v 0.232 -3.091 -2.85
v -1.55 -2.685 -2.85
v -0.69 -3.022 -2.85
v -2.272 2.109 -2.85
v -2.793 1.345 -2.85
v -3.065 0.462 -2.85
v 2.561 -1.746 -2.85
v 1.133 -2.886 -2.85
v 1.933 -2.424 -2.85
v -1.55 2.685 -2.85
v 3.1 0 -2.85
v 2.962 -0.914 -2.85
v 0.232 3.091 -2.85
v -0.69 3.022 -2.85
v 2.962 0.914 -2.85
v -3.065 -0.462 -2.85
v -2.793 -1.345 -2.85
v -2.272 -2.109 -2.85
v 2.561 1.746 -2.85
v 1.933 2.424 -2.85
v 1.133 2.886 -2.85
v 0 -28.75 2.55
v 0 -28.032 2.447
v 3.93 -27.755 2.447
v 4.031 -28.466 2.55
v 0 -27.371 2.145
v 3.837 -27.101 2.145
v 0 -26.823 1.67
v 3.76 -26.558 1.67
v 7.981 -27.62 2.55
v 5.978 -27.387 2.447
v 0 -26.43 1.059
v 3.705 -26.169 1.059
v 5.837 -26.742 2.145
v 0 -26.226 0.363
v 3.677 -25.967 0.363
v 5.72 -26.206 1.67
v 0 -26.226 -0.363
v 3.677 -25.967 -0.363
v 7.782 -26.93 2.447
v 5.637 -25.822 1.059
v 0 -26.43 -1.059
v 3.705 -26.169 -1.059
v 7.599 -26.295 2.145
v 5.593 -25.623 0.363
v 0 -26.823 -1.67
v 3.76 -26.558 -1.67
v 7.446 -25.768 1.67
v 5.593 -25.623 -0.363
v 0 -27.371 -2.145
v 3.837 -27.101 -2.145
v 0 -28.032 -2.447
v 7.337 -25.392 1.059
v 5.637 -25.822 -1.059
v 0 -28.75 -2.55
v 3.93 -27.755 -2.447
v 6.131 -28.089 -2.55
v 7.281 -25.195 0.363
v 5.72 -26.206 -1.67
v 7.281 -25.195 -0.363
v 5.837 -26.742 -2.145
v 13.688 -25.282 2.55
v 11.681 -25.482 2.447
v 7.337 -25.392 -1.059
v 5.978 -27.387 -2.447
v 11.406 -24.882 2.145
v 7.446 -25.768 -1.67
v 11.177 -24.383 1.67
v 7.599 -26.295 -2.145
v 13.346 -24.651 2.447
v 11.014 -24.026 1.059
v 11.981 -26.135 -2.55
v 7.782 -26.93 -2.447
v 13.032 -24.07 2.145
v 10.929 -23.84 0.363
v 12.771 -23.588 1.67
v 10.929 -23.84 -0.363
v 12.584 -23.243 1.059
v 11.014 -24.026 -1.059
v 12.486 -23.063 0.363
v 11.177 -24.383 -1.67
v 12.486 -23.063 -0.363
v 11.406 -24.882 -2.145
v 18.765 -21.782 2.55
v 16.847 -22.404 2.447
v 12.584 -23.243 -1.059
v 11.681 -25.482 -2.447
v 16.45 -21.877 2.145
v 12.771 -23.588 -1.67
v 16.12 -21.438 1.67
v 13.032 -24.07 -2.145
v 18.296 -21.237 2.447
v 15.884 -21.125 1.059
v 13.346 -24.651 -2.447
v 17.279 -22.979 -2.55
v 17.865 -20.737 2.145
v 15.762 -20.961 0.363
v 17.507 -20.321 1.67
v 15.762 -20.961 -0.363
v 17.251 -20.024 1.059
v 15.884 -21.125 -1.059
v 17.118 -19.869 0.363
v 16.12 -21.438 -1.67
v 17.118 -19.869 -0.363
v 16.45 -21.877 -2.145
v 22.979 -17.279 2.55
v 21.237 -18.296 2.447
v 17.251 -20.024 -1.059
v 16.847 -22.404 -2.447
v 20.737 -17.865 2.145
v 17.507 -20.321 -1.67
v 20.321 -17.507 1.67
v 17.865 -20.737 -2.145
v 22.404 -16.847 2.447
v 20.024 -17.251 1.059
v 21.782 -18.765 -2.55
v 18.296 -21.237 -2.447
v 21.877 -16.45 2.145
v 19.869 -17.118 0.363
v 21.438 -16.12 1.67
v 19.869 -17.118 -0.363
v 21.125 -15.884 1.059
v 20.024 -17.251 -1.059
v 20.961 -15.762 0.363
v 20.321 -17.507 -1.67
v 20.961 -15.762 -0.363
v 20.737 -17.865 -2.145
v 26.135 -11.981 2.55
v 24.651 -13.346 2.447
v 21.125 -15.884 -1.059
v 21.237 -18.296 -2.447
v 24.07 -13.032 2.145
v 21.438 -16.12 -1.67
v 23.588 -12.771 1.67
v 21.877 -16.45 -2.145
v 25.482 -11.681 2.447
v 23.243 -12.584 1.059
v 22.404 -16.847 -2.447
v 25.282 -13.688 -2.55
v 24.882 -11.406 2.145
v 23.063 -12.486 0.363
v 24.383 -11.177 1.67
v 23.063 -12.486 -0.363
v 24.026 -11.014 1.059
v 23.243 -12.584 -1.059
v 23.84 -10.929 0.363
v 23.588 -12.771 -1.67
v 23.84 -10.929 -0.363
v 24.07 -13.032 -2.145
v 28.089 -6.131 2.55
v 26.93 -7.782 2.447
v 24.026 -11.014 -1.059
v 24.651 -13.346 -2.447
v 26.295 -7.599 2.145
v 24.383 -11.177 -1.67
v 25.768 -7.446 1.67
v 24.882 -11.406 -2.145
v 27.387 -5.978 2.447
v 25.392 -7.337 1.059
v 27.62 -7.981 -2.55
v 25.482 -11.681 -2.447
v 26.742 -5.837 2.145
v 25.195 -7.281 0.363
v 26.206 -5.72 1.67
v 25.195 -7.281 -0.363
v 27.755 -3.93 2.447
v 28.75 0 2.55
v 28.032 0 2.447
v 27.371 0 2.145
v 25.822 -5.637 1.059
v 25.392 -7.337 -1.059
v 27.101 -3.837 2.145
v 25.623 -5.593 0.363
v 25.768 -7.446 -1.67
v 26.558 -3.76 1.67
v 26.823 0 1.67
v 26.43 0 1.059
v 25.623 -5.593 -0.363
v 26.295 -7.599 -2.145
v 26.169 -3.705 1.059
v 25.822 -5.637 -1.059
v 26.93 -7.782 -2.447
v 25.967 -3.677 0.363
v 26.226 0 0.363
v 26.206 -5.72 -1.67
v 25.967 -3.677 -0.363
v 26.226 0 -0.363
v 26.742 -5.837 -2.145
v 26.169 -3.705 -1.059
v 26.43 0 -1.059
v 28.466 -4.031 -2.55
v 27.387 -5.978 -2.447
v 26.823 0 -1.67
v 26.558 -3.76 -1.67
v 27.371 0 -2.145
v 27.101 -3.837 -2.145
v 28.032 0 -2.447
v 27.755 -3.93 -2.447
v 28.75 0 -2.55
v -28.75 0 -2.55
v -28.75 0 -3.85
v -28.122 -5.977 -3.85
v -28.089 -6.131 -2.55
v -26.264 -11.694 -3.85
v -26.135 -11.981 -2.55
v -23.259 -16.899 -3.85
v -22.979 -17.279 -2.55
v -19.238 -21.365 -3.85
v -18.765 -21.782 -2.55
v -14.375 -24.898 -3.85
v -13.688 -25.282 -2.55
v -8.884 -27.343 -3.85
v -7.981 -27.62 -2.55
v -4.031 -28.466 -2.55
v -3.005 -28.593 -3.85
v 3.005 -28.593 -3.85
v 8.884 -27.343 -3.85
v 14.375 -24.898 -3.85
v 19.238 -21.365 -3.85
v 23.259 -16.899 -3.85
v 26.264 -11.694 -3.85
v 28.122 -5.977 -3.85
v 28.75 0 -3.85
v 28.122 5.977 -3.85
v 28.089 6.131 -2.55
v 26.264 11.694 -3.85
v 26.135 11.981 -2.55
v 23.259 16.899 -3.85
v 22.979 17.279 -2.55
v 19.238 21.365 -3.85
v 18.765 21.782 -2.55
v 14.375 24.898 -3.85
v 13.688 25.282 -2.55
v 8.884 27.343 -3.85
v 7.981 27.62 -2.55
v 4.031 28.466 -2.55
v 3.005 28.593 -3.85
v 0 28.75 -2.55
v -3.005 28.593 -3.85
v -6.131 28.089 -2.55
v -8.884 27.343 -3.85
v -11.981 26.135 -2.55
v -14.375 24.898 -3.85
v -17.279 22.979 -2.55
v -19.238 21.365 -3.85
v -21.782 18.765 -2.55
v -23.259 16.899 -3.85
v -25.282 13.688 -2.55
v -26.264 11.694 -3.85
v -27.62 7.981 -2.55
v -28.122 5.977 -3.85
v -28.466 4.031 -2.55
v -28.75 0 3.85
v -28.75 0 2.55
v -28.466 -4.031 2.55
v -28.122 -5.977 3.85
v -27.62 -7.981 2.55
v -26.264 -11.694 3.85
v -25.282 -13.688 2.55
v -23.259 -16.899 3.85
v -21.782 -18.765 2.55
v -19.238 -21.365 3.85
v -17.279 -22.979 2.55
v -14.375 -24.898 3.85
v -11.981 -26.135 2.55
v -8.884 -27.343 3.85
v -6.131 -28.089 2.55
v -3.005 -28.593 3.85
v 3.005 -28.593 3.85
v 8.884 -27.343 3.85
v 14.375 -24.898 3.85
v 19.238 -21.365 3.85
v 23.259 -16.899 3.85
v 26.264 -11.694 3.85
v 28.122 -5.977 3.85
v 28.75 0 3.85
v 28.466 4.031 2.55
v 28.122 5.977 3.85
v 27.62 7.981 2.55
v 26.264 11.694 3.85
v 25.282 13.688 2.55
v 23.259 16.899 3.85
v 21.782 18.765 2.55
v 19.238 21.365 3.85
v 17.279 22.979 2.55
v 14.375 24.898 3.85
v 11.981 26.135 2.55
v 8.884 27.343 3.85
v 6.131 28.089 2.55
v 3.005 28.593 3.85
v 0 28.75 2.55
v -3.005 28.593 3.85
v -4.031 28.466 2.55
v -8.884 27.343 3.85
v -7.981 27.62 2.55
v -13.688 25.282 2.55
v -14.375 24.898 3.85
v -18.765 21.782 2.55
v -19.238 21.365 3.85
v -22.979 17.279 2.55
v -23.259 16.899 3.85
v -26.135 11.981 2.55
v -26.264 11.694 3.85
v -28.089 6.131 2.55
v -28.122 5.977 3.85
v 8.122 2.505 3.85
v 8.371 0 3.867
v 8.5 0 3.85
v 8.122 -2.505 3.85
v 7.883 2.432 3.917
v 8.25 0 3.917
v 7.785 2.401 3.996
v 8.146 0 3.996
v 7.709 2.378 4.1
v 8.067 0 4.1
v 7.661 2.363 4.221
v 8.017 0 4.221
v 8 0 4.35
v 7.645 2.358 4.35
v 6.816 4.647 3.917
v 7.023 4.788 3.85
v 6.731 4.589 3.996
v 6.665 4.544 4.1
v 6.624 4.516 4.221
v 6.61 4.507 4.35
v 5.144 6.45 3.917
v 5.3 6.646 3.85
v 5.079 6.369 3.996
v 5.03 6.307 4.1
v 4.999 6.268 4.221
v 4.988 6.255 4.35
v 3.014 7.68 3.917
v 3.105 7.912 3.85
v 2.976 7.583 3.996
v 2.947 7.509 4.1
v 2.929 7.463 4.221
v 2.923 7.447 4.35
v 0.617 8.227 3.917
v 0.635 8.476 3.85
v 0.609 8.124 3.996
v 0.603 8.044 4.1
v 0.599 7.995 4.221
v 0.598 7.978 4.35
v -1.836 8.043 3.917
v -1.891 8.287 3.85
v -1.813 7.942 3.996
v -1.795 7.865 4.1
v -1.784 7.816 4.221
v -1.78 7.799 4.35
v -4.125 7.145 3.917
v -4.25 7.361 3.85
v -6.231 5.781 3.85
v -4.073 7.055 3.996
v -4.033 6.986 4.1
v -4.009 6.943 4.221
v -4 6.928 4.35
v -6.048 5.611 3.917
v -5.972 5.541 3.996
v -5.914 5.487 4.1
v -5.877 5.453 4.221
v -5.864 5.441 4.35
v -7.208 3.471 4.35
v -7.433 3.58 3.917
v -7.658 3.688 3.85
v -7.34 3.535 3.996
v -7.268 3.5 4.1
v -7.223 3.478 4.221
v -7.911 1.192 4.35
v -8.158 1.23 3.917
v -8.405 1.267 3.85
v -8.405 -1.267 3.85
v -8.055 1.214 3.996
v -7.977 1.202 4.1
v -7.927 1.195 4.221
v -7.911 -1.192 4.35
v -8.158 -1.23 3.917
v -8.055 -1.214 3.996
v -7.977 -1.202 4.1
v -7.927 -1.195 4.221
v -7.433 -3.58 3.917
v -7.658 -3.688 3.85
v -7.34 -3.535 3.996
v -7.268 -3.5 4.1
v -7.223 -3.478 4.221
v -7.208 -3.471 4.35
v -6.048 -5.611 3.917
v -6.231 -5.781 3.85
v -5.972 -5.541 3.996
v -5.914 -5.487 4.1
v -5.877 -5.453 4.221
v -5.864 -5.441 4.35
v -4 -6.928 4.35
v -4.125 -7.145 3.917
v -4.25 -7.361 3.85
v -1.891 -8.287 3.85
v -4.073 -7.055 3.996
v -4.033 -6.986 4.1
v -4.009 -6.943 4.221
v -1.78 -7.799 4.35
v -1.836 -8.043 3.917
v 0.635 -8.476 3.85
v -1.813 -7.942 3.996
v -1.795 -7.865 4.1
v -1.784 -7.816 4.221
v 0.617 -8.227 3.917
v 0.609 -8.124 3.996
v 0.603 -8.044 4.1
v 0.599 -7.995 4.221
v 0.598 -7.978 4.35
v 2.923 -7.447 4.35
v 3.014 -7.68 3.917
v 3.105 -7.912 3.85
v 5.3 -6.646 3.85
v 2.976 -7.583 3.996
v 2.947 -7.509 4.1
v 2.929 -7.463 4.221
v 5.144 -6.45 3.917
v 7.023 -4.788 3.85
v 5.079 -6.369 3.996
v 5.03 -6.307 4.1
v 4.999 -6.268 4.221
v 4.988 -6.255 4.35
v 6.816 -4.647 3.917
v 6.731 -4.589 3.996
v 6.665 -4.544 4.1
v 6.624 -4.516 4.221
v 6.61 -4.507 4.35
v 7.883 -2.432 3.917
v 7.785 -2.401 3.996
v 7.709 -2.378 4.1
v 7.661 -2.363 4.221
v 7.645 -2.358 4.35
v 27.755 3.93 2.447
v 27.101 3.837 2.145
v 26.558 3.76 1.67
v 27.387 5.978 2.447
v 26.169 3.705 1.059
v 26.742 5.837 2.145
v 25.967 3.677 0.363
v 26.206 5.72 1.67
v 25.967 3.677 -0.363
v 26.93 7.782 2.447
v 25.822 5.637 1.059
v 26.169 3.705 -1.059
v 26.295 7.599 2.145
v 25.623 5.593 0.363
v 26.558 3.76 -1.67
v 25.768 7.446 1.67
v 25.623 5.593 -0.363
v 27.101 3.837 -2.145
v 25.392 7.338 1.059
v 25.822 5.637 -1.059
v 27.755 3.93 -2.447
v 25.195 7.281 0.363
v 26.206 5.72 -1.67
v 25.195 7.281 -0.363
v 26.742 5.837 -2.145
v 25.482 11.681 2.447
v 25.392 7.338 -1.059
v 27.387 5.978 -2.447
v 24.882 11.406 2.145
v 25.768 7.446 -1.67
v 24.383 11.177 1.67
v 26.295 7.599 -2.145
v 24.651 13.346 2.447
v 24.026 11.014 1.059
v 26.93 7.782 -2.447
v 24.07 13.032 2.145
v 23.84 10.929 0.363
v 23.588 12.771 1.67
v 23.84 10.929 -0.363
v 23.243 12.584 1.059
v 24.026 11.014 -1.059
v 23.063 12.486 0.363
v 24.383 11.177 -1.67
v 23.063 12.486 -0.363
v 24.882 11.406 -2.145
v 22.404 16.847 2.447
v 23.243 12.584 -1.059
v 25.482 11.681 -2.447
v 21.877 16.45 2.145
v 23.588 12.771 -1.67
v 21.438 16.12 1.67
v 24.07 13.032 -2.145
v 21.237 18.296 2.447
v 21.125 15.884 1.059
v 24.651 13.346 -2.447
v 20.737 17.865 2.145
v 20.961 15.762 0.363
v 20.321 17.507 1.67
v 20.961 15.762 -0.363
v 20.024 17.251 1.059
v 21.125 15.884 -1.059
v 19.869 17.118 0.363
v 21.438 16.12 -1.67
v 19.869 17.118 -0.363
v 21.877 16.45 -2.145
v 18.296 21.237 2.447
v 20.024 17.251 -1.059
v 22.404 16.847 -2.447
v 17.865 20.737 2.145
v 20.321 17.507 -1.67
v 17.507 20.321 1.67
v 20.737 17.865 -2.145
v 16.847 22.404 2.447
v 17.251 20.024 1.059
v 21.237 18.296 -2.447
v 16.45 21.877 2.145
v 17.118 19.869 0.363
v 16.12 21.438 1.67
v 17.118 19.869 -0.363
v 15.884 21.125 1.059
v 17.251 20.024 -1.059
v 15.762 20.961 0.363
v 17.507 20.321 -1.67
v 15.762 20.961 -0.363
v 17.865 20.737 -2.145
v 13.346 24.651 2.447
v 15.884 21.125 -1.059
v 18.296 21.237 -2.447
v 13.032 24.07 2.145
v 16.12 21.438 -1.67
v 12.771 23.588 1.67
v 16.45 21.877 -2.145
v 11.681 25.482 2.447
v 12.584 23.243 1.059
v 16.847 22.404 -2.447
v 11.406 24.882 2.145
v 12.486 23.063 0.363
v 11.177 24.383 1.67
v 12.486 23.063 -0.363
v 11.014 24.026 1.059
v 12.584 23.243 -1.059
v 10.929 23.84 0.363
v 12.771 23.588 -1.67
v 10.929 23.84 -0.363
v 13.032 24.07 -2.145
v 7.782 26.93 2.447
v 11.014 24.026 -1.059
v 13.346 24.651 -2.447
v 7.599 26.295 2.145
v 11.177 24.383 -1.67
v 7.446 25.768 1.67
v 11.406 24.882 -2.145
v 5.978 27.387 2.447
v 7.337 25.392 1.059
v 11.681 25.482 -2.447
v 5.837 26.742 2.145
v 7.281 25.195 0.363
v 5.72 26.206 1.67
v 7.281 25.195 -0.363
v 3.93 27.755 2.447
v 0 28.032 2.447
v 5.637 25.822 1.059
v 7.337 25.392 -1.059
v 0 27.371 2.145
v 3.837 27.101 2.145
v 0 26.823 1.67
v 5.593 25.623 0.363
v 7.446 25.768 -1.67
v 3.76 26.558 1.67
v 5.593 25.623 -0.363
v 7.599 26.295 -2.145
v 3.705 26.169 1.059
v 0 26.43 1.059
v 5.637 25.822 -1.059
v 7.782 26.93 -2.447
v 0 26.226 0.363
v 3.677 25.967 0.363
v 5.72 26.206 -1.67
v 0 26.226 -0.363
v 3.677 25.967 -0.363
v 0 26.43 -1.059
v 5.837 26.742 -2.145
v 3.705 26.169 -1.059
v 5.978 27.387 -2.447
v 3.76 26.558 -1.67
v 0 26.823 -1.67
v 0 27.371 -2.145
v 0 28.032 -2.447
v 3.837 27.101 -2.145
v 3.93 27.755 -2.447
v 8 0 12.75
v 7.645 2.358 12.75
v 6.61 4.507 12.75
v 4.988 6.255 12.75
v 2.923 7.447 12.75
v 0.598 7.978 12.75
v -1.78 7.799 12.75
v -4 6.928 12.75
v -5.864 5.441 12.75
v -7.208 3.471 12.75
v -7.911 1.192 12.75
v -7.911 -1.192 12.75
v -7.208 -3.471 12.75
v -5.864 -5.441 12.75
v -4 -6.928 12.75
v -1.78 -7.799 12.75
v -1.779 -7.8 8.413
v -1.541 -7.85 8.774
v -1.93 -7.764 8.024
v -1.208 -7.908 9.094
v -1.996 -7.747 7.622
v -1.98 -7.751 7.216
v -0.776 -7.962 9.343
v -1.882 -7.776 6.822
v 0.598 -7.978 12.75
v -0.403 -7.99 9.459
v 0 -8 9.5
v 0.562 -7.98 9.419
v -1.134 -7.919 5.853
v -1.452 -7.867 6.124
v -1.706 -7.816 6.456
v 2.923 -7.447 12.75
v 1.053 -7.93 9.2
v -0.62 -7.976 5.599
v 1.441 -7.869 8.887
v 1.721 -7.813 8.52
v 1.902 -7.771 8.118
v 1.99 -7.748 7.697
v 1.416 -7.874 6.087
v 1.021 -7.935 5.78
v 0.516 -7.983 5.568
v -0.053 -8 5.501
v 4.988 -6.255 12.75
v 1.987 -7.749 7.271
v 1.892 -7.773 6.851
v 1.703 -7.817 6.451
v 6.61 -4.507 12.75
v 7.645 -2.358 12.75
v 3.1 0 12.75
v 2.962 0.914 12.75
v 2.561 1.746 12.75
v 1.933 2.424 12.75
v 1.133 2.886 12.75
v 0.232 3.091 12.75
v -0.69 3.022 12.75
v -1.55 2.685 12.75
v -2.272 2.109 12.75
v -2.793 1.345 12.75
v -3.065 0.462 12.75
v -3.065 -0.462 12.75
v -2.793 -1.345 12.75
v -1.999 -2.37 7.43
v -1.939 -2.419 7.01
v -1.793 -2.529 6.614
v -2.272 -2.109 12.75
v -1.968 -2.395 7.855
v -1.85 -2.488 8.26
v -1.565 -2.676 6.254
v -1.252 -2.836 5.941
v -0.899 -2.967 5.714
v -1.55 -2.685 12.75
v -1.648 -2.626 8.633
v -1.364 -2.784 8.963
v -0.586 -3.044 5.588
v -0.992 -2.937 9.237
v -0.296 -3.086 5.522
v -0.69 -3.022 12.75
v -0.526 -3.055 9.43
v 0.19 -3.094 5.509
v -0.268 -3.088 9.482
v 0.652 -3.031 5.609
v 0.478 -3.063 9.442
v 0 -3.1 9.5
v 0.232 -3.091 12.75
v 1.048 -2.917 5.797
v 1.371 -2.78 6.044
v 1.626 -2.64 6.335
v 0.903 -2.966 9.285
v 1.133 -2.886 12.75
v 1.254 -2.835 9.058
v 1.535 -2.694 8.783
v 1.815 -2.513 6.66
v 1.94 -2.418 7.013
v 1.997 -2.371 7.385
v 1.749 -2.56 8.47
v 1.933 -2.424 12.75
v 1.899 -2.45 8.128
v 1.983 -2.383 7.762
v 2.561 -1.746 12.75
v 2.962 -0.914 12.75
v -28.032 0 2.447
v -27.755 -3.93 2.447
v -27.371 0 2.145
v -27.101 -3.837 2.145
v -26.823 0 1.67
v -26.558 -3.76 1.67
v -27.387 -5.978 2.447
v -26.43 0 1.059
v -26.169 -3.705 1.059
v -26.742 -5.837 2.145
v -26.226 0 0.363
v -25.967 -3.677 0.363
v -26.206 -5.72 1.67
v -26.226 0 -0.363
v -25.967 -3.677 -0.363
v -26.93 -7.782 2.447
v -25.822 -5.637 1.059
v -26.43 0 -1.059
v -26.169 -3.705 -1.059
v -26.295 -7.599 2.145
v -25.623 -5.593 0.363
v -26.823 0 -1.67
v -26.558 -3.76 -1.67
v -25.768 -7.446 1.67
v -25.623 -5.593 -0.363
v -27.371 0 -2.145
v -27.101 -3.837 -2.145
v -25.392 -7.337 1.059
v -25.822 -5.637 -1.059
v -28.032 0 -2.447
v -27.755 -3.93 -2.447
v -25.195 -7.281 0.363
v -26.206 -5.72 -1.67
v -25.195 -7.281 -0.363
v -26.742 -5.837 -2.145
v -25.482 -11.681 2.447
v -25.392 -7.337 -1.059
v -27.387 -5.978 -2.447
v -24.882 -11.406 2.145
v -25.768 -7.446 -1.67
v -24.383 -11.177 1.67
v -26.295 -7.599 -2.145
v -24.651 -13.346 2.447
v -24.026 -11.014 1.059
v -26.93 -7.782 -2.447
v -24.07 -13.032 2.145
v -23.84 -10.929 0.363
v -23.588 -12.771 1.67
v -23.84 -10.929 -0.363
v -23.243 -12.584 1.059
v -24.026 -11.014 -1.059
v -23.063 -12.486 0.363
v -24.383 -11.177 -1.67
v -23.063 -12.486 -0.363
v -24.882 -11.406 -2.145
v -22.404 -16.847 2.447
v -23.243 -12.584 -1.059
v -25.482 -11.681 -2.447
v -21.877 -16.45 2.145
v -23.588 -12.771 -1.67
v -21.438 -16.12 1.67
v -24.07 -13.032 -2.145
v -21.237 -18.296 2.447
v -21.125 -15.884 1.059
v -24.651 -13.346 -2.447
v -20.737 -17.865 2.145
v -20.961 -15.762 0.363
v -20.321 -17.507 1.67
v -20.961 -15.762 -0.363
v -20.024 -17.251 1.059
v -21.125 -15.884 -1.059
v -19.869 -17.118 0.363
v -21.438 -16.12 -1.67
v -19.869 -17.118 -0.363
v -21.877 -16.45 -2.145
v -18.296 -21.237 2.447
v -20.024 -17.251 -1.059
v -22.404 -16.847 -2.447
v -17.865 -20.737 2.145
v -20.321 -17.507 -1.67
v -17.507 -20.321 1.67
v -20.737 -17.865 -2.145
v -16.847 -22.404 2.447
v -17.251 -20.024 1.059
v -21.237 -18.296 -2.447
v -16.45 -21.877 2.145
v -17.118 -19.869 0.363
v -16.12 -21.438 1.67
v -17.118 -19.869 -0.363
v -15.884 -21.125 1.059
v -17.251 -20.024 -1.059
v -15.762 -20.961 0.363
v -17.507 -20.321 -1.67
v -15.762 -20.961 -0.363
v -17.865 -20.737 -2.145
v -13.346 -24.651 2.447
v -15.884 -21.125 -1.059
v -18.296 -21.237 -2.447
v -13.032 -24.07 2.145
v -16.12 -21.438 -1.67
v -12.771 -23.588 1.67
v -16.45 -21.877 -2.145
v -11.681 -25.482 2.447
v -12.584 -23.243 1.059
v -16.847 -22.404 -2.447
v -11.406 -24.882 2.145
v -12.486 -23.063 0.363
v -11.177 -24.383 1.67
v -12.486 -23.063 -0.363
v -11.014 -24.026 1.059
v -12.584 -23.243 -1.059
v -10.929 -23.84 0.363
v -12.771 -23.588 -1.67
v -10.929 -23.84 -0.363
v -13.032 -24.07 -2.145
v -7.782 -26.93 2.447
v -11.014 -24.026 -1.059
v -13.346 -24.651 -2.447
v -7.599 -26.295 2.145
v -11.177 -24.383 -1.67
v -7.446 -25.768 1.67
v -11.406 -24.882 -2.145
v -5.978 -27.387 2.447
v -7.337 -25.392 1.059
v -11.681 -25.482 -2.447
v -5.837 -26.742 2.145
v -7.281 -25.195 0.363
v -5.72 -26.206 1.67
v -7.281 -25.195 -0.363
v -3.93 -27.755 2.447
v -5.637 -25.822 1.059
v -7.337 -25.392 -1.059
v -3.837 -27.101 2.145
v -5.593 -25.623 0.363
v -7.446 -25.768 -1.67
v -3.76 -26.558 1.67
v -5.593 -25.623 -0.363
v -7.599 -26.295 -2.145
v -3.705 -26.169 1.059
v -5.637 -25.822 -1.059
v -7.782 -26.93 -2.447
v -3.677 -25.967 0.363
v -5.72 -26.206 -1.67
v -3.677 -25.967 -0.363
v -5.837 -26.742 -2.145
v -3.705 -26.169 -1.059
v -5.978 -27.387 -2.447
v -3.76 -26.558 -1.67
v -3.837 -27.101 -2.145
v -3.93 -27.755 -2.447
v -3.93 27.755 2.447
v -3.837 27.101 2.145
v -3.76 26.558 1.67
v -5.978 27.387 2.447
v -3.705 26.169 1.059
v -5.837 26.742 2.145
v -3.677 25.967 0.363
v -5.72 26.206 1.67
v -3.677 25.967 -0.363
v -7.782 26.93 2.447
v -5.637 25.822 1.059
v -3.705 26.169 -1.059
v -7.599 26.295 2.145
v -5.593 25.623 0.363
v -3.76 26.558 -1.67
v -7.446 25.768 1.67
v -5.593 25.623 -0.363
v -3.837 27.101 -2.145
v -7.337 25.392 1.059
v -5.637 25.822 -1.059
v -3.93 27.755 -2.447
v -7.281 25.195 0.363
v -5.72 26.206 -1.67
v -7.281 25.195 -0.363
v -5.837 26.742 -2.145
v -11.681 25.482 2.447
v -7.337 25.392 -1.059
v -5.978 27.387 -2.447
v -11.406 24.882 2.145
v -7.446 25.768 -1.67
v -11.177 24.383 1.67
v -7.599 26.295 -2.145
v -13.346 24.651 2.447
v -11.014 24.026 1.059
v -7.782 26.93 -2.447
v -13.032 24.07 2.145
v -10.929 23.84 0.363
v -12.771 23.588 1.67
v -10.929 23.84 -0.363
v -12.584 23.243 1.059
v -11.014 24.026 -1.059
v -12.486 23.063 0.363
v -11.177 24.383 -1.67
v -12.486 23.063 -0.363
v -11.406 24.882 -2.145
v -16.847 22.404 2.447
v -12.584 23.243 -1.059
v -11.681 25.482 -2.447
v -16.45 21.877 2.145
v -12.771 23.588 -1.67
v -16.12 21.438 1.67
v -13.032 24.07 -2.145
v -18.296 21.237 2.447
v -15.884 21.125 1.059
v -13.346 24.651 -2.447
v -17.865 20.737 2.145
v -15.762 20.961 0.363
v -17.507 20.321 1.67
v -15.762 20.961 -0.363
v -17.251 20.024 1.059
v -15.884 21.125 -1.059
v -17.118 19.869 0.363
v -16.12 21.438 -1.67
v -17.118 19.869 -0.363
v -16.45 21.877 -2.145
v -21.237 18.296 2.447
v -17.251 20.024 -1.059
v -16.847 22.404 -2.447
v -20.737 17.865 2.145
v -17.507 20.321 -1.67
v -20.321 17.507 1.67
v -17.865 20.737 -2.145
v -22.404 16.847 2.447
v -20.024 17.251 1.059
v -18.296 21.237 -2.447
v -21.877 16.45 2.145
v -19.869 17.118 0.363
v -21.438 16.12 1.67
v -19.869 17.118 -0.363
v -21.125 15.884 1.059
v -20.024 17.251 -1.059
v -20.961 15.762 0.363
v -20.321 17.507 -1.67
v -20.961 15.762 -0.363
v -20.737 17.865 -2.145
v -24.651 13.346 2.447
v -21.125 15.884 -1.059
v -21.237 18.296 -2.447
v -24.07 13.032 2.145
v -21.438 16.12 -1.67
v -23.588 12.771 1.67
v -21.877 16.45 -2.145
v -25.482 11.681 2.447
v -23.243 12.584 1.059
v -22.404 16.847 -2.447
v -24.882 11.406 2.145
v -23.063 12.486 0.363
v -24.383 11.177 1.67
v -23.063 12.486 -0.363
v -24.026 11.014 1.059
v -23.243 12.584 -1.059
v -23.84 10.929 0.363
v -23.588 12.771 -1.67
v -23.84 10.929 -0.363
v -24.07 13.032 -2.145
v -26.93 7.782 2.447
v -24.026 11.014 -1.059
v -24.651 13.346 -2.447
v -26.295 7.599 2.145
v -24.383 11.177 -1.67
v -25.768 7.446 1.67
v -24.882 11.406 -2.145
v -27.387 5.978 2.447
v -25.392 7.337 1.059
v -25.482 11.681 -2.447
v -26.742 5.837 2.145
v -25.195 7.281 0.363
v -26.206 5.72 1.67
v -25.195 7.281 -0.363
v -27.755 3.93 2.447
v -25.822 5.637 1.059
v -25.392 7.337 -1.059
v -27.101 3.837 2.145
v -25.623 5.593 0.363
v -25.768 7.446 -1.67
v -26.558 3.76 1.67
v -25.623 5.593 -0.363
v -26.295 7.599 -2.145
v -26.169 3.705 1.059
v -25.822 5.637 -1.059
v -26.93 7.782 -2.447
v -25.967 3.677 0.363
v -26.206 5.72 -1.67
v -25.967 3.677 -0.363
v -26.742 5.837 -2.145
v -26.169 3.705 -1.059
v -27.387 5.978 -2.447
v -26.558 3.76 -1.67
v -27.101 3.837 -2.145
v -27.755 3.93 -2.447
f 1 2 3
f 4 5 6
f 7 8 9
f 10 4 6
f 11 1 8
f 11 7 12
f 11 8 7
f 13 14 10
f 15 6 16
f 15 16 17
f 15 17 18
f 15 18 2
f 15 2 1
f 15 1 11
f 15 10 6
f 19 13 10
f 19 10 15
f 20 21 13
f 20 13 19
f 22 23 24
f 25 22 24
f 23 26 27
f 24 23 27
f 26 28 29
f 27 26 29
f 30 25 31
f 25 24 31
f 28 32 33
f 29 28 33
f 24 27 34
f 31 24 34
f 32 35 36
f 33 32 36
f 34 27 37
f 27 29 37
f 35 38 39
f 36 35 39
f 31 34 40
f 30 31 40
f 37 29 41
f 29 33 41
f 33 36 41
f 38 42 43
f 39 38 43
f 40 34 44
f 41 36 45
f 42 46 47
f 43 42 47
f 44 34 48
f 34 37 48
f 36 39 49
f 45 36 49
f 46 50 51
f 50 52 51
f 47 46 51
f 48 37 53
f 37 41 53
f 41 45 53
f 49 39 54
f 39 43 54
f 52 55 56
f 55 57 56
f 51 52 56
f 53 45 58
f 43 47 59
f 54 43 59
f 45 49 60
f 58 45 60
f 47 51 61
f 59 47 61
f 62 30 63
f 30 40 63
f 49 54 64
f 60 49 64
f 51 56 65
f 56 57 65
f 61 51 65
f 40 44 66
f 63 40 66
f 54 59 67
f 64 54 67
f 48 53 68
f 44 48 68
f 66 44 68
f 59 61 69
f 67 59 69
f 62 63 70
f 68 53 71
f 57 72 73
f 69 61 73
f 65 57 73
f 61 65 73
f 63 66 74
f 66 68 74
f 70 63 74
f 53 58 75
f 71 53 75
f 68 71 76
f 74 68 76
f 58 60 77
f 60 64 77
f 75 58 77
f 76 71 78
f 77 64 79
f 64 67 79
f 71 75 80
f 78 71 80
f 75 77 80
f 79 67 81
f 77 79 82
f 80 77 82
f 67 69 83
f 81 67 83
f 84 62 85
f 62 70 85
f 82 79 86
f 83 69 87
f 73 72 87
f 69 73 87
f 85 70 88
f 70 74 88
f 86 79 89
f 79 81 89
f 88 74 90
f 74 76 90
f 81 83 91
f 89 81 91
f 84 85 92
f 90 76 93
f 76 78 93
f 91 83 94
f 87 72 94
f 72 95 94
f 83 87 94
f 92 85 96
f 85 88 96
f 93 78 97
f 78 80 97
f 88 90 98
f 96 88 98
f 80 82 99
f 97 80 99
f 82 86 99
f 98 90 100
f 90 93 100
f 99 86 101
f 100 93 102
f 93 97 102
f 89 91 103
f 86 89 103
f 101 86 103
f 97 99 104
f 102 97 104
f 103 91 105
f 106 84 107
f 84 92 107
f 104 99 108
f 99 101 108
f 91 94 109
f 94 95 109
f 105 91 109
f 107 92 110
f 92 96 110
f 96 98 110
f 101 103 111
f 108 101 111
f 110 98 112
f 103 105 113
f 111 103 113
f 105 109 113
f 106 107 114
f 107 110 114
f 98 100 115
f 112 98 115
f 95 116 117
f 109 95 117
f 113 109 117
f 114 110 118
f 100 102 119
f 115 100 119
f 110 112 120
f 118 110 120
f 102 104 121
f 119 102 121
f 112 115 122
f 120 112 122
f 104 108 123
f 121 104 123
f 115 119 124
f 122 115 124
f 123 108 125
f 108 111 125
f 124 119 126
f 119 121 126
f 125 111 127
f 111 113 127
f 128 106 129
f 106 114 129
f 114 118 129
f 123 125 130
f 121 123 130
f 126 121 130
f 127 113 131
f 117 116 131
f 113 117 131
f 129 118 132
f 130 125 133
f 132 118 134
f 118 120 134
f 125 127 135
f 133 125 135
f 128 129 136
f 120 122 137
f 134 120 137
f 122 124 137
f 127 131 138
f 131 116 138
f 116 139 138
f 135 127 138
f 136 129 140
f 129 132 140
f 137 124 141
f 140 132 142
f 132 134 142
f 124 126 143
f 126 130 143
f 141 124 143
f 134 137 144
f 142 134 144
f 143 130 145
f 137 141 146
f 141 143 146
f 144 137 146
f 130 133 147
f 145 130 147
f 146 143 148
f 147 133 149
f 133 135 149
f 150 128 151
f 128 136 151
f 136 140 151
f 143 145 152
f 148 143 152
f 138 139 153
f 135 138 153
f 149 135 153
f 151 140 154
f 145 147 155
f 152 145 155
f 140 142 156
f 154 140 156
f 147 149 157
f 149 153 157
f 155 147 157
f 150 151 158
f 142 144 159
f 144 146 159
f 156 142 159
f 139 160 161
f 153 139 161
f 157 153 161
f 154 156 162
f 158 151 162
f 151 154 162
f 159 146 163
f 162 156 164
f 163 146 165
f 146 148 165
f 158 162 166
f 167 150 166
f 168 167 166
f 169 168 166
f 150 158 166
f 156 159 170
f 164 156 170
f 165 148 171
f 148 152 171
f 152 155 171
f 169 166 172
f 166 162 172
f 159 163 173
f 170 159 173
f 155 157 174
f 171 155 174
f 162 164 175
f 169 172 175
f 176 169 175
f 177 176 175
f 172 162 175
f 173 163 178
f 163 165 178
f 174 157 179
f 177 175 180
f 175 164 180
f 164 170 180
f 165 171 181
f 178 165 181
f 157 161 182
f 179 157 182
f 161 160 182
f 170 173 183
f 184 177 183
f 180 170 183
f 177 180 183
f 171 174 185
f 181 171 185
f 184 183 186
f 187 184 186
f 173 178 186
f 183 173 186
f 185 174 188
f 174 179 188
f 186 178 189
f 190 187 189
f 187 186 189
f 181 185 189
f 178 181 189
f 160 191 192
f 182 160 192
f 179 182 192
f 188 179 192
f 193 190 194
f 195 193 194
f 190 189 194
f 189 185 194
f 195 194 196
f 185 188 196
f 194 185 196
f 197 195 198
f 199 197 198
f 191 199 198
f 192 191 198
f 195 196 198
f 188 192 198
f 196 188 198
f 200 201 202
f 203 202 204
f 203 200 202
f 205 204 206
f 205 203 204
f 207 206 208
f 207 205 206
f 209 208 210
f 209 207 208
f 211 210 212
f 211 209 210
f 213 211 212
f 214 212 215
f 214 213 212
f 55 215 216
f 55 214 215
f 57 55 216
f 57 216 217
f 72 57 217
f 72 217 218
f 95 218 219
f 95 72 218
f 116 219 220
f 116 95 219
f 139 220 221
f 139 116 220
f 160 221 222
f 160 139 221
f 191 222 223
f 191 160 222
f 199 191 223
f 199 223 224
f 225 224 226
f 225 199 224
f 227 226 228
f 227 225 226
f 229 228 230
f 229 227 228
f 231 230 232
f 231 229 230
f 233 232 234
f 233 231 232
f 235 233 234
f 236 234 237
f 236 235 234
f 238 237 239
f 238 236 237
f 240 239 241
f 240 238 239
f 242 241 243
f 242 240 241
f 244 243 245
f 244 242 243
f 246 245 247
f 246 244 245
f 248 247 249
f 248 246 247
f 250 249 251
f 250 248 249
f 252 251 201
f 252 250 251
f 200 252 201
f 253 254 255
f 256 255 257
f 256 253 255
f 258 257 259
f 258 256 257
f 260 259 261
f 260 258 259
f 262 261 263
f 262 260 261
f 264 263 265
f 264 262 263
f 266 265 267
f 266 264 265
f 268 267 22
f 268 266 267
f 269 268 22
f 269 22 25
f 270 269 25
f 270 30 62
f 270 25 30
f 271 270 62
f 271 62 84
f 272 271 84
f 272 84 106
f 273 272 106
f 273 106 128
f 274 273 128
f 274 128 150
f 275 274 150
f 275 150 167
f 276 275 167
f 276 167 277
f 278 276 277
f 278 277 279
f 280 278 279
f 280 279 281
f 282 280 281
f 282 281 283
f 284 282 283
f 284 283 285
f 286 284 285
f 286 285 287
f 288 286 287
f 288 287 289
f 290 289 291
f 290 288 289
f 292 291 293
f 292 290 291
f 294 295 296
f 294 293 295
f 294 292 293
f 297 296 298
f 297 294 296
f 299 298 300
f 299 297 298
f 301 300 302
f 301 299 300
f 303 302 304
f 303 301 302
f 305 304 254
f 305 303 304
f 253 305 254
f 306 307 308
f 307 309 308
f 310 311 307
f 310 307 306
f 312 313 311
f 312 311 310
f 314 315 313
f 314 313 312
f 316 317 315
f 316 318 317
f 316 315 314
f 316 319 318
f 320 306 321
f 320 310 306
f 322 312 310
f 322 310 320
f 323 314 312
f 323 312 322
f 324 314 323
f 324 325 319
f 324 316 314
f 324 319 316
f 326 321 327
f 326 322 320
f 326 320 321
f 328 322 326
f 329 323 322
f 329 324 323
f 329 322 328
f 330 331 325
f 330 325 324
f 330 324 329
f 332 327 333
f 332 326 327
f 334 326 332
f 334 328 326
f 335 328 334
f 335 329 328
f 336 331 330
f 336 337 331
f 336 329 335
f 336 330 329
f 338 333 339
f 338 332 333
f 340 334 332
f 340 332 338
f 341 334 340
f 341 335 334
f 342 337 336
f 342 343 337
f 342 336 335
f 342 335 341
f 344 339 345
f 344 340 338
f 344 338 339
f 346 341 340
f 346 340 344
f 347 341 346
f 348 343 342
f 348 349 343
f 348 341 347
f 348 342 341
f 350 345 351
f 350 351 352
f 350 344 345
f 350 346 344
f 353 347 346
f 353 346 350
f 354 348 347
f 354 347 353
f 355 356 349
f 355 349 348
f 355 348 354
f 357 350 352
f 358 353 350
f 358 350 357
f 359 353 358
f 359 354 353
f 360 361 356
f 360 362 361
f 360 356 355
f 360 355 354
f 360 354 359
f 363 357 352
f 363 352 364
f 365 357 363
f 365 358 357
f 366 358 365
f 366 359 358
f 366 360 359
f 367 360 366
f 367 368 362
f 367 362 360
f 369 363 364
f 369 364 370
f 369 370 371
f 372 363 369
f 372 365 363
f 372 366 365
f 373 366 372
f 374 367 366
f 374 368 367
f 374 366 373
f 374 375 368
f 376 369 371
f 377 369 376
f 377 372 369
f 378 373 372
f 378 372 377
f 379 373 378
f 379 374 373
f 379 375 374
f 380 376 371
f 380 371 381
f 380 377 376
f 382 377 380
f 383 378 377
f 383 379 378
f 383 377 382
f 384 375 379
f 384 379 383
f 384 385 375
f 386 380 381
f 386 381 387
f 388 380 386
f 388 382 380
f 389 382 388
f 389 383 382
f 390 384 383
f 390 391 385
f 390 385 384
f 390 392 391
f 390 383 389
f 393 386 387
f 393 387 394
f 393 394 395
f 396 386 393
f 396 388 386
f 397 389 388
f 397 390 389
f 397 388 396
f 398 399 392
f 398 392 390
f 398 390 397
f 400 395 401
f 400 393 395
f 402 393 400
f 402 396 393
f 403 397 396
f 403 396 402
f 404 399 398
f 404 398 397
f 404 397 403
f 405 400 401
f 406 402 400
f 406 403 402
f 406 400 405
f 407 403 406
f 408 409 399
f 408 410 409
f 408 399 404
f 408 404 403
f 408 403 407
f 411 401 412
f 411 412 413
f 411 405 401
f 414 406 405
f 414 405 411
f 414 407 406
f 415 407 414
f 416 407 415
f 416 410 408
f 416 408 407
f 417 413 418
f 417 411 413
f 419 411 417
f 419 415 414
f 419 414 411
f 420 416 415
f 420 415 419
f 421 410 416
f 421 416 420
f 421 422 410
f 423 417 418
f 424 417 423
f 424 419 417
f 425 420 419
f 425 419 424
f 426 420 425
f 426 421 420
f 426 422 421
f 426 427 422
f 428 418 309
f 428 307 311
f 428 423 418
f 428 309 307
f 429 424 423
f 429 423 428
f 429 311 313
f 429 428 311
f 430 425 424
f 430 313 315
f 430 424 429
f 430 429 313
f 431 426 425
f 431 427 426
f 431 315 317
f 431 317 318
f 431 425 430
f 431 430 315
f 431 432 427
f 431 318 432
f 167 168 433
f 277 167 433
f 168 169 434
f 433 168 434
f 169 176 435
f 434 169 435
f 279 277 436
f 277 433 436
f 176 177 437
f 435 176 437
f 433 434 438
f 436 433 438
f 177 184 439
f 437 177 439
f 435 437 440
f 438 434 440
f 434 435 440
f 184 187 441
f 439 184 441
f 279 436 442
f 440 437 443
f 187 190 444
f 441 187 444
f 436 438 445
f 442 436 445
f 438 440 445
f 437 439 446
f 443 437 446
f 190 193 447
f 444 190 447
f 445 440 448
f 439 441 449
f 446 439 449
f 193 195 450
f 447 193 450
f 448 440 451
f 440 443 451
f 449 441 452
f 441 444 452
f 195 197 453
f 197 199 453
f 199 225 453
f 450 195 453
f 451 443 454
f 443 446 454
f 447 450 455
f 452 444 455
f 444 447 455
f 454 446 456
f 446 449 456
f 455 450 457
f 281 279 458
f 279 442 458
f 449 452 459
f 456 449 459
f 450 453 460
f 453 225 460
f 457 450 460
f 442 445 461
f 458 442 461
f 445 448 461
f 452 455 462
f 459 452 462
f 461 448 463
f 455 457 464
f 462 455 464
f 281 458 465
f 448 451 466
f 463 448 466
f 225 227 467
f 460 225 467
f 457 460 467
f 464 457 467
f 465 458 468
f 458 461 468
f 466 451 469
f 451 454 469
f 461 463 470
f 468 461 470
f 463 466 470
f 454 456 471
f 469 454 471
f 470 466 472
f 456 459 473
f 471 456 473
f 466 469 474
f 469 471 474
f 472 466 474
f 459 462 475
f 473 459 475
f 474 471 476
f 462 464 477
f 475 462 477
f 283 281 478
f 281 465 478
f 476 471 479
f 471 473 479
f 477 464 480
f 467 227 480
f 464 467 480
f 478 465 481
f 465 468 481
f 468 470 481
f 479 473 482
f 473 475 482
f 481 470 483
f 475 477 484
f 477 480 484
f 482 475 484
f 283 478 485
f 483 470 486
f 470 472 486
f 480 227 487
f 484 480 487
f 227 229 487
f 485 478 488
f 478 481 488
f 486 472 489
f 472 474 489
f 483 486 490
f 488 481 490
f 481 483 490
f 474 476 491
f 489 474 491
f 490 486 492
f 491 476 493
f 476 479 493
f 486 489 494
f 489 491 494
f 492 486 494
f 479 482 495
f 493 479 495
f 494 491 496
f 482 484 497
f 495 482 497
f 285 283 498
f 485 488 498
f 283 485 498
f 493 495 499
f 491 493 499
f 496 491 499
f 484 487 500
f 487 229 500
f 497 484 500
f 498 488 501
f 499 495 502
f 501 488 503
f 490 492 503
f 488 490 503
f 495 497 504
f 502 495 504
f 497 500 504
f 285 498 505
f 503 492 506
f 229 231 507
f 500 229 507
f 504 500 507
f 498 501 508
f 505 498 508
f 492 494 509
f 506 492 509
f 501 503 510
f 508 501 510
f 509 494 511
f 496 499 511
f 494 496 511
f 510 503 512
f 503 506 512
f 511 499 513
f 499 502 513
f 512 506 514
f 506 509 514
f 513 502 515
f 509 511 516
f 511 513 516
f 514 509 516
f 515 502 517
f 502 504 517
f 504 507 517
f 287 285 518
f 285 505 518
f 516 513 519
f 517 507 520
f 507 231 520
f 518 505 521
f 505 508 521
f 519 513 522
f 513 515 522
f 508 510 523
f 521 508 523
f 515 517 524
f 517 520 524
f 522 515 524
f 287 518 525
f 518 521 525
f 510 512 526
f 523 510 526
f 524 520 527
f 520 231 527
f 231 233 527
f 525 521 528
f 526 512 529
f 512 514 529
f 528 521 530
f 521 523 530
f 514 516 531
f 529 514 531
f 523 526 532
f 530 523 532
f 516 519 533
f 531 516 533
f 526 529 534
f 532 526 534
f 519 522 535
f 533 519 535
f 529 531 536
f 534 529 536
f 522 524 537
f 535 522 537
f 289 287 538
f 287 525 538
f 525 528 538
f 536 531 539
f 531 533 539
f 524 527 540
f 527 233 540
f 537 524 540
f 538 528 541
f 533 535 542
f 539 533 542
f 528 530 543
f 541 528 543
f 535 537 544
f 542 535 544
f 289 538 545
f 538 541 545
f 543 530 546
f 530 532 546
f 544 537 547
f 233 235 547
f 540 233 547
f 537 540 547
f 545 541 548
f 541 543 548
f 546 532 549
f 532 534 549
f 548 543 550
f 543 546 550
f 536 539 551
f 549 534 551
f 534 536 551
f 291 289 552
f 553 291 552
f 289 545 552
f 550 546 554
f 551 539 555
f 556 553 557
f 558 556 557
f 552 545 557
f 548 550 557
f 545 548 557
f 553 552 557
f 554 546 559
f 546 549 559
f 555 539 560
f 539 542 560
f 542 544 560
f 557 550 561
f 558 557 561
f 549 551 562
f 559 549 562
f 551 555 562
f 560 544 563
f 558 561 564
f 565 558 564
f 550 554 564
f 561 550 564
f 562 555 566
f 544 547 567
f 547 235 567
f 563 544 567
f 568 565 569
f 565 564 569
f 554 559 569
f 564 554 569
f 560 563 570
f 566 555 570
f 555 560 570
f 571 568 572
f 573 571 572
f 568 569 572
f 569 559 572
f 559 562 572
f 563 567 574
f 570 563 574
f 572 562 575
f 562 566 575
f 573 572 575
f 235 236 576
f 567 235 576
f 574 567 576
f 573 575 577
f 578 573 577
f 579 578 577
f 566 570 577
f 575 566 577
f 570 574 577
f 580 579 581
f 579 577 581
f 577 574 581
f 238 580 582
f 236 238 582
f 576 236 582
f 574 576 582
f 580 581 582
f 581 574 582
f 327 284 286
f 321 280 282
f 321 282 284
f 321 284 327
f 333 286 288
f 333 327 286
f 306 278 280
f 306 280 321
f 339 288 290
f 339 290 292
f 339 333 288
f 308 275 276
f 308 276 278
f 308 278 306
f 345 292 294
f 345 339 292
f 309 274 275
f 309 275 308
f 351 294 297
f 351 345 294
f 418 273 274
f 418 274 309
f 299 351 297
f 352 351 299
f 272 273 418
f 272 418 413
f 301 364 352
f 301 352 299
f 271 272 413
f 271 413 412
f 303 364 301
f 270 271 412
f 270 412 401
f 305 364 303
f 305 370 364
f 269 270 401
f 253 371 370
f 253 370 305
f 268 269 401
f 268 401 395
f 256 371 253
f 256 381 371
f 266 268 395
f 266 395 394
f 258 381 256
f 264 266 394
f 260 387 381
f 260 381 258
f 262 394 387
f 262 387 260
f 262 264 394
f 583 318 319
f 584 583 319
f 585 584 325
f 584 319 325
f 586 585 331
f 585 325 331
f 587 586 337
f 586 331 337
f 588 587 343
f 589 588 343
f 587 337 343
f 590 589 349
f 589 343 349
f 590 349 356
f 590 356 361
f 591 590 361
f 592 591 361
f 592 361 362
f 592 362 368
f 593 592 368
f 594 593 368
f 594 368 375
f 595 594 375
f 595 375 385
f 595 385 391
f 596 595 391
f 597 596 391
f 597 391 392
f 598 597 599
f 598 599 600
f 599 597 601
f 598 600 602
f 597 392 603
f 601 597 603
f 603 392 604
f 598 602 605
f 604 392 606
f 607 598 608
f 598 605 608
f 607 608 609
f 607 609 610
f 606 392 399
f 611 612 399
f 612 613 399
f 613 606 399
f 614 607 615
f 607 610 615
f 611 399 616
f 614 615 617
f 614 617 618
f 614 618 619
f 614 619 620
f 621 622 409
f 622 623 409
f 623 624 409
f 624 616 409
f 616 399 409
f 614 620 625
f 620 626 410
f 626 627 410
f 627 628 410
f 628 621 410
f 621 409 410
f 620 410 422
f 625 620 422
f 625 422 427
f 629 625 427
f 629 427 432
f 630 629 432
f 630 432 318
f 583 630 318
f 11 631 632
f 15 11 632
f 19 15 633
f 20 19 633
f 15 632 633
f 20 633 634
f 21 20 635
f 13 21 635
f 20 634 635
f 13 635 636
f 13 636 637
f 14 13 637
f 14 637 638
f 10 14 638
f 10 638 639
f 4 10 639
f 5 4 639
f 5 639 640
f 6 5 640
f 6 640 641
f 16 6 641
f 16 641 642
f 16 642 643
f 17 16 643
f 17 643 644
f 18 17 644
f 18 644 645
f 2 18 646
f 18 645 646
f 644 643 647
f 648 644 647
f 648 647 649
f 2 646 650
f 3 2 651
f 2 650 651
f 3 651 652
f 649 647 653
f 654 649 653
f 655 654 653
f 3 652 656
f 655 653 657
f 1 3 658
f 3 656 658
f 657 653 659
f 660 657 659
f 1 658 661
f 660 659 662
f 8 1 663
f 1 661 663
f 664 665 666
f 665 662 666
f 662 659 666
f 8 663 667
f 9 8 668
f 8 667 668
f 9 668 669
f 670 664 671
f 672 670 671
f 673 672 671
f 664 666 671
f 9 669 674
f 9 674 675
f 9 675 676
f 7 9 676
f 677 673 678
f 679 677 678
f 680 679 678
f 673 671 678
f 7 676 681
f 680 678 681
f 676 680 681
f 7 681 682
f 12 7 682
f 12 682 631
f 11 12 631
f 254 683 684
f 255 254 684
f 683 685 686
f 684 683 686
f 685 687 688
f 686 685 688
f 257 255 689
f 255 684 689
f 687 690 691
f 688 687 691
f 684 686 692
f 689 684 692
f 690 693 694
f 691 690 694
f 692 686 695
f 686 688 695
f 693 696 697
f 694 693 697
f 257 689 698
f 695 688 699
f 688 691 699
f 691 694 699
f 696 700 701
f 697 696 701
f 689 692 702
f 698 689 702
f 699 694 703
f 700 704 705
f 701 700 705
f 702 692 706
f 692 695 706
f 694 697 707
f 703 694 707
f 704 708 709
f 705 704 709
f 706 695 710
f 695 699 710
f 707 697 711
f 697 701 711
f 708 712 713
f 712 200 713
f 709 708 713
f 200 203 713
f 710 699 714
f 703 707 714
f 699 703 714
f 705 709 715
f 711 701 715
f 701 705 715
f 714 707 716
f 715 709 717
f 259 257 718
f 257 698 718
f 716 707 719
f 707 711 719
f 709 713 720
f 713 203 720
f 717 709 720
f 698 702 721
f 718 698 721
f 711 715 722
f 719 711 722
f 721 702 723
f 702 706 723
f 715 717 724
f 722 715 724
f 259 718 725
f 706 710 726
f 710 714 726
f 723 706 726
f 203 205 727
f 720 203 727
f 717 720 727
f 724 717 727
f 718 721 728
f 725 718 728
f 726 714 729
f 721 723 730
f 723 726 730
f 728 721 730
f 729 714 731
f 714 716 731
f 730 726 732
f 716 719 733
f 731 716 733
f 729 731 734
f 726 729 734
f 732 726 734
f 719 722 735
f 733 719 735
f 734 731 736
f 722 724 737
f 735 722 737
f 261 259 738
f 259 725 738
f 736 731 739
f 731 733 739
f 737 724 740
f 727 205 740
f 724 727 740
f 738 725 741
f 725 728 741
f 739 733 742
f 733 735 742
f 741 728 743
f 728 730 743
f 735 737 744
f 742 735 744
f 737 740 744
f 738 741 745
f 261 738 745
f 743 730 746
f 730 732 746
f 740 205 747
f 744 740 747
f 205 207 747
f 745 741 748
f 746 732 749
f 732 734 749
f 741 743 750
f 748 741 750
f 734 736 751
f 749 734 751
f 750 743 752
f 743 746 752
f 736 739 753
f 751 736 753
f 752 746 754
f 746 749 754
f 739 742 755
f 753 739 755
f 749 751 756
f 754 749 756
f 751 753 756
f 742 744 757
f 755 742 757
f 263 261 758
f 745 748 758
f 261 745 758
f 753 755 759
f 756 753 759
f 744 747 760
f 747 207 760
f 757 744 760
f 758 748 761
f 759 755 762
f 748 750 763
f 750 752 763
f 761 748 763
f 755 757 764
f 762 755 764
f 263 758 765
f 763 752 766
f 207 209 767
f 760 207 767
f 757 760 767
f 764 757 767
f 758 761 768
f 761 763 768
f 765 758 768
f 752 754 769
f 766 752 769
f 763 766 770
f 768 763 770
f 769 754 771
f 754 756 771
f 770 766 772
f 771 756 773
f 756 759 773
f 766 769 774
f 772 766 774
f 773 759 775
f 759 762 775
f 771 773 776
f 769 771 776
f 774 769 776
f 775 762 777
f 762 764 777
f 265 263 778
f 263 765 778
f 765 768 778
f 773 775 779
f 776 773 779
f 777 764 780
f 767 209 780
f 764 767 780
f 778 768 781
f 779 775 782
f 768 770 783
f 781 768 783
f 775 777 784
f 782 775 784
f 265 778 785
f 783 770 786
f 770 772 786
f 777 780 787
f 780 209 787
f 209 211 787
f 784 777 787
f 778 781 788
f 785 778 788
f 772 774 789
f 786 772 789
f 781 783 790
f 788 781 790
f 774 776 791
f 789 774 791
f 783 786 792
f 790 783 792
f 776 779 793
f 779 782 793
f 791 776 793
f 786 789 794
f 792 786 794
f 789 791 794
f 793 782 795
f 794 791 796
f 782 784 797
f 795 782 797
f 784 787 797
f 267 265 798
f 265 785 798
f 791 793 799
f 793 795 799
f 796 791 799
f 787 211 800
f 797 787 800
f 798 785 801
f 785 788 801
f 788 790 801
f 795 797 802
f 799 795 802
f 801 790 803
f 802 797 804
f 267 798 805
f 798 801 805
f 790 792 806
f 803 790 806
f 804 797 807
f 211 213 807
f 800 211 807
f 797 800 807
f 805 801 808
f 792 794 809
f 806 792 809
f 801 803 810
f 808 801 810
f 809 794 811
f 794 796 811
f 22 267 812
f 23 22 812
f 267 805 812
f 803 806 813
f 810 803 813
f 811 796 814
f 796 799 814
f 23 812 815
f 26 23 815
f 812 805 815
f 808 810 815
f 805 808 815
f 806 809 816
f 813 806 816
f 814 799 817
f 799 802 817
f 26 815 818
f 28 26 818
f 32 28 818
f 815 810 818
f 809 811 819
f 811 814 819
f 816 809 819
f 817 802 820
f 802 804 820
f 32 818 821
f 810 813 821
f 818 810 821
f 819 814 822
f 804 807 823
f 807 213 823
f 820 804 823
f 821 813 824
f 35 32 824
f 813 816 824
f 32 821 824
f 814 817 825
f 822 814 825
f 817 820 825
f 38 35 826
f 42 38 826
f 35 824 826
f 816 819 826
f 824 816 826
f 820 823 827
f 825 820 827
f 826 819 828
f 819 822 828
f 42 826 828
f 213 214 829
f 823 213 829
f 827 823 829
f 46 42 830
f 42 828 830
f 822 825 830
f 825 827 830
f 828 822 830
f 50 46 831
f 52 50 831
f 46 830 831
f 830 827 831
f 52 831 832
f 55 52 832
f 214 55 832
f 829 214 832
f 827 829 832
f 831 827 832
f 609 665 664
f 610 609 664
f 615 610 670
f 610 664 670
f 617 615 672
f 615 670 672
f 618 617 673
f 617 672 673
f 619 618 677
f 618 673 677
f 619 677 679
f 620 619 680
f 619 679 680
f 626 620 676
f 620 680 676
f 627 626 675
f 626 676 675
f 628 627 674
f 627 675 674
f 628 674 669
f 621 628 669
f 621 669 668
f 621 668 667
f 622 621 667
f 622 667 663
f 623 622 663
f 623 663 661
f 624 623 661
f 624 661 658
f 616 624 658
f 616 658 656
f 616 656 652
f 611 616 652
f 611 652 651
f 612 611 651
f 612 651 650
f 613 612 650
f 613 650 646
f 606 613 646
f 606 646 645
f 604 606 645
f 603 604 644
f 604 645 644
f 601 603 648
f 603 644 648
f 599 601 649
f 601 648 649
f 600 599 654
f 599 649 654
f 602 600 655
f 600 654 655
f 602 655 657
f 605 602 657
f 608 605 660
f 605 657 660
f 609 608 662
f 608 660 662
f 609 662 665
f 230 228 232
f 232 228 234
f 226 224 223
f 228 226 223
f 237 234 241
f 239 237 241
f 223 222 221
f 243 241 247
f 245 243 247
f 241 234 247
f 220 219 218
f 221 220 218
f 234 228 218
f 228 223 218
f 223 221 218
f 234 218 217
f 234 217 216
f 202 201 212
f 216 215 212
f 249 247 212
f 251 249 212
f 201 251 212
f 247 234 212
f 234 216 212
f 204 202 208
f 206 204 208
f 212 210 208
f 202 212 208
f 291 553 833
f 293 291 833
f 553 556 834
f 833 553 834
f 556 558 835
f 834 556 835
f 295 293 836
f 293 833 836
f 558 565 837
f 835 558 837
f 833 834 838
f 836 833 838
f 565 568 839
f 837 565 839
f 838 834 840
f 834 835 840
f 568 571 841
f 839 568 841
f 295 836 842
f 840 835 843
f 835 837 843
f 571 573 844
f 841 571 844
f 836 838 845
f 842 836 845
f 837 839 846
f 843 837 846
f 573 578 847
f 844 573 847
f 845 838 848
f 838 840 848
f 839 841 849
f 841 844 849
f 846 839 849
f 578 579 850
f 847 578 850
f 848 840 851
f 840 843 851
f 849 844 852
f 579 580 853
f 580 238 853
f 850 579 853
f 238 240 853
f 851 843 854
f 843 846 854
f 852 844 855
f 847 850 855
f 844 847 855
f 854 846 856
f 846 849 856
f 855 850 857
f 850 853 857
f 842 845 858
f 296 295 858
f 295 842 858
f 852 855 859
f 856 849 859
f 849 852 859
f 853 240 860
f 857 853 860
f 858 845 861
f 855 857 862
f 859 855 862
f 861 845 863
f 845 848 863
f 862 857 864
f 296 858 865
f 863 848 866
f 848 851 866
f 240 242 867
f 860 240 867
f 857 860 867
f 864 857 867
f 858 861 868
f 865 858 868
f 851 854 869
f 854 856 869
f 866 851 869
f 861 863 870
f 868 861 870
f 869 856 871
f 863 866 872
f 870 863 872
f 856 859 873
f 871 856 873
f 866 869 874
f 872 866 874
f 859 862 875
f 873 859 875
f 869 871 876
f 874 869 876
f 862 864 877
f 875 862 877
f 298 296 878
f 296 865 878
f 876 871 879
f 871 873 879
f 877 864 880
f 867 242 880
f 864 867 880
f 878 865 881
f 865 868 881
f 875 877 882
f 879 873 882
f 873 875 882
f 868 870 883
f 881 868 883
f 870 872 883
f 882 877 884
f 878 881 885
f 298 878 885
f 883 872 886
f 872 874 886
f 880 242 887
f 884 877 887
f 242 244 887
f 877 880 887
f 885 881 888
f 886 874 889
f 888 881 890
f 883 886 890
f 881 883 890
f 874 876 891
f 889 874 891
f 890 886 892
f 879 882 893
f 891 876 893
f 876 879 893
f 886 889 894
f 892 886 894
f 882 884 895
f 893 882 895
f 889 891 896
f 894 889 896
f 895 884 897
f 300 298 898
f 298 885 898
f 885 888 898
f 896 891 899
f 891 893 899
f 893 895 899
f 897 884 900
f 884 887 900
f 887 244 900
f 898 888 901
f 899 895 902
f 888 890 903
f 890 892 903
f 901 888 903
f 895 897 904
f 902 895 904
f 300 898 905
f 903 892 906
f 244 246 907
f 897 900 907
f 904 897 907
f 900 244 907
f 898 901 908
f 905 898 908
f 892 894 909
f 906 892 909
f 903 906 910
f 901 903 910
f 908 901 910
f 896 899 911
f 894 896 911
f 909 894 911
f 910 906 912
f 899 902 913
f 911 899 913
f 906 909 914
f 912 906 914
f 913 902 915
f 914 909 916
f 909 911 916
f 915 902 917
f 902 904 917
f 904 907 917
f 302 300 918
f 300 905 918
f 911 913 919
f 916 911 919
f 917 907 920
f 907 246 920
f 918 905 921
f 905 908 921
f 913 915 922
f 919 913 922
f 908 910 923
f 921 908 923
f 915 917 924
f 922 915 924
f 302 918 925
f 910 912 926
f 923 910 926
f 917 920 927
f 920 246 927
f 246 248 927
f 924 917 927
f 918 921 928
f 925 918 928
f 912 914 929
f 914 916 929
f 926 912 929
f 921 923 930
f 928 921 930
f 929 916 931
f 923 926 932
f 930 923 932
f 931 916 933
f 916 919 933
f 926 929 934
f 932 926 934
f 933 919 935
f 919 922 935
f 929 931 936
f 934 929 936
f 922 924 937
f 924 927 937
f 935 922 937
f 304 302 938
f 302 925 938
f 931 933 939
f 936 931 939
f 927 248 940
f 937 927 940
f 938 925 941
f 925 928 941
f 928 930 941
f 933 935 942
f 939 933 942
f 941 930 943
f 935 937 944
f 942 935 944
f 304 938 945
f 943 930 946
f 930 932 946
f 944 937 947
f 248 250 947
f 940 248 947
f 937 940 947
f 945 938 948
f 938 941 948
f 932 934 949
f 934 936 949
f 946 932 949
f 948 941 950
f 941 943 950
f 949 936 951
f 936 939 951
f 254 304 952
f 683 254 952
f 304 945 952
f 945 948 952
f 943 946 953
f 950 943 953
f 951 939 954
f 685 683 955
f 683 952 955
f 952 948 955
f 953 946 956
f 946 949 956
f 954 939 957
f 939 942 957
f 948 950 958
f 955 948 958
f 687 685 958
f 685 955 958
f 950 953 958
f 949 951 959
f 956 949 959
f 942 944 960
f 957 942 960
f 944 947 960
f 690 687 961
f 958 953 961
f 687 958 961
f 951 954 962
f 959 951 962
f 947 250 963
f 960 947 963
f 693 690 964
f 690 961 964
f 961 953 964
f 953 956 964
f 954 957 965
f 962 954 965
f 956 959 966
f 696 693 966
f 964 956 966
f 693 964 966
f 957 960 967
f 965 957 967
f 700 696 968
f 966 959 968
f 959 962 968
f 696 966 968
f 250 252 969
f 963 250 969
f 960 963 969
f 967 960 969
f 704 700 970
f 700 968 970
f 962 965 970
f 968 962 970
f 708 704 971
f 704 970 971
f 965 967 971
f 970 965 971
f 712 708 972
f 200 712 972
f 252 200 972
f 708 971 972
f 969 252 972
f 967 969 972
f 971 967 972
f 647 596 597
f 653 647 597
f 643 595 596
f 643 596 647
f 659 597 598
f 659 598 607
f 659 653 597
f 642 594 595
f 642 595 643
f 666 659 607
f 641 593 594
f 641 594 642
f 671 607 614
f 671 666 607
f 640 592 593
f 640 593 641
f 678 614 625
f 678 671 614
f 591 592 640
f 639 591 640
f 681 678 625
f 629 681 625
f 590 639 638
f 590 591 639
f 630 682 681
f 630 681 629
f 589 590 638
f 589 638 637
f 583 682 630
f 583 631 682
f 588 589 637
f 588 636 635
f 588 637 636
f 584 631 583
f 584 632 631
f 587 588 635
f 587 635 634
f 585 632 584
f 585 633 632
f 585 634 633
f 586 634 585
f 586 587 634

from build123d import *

# Parameters (mm, degrees)
SKETCH1_R           = 28.75
BOSS_EXTRUDE1_DEPTH = 3.85
SKETCH2_R           = 2.55
SKETCH4_R           = 8
BOSS_EXTRUDE2_DEPTH = 8.9
SKETCH5_R           = 3.1
CUT_EXTRUDE1_DEPTH  = 15.6
SKETCH6_R           = 2
CUT_EXTRUDE2_DEPTH  = 43.61088476
FILLET1_R           = 0.5


with BuildPart() as part:
    # Sketch1 → Boss-Extrude1 (new, symmetric)
    with BuildSketch(Plane.XY):
        with Locations(Location((0, 0, 0), (0, 0, 180))):
            Circle(SKETCH1_R)
    extrude(amount=BOSS_EXTRUDE1_DEPTH, both=True)

    # Cut-Sweep1: sweep along a curve in space
    with BuildLine() as cut_sweep1_path:
        ThreePointArc((28.75, 0, -3.85), (20.329319959, 20.329319959, -3.85), (0, 28.75, -3.85))
        ThreePointArc((0, 28.75, -3.85), (-20.329319959, 20.329319959, -3.85), (-28.75, 0, -3.85))
        ThreePointArc((-28.75, 0, -3.85), (-20.329319959, -20.329319959, -3.85), (0, -28.75, -3.85))
        ThreePointArc((0, -28.75, -3.85), (20.329319959, -20.329319959, -3.85), (28.75, 0, -3.85))
    # Sketch2 → Cut-Sweep1 (sweep, cut)
    with BuildSketch(Plane(origin=(0, 0, 0), x_dir=(1, 0, 0), z_dir=(0, 1, 0))):
        with Locations((28.75, 0)):
            Circle(SKETCH2_R)
    sweep(path=cut_sweep1_path.line, mode=Mode.SUBTRACT)

    # Sketch4 → Boss-Extrude2 (add)
    with BuildSketch(Plane.XY.offset(3.85)):
        Circle(SKETCH4_R)
    extrude(amount=BOSS_EXTRUDE2_DEPTH)

    # Sketch5 → Cut-Extrude1 (cut)
    with BuildSketch(Plane.XY.offset(12.75)):
        Circle(SKETCH5_R)
    extrude(amount=-CUT_EXTRUDE1_DEPTH, mode=Mode.SUBTRACT)

    # Sketch6 → Cut-Extrude2 (cut, through all)
    with BuildSketch(Plane(origin=(0, 0, 0), x_dir=(1, 0, 0), z_dir=(0, 1, 0))):
        with Locations(Location((0, -7.5, 0), (0, 0, 270))):
            Circle(SKETCH6_R)
    extrude(amount=-CUT_EXTRUDE2_DEPTH, mode=Mode.SUBTRACT)

    # Fillet1
    fillet1_edges = [part.edges().sort_by_distance(p)[0] for p in [
        (-8, 0, 3.85),
    ]]
    fillet(fillet1_edges, radius=FILLET1_R)


solid = part.part
